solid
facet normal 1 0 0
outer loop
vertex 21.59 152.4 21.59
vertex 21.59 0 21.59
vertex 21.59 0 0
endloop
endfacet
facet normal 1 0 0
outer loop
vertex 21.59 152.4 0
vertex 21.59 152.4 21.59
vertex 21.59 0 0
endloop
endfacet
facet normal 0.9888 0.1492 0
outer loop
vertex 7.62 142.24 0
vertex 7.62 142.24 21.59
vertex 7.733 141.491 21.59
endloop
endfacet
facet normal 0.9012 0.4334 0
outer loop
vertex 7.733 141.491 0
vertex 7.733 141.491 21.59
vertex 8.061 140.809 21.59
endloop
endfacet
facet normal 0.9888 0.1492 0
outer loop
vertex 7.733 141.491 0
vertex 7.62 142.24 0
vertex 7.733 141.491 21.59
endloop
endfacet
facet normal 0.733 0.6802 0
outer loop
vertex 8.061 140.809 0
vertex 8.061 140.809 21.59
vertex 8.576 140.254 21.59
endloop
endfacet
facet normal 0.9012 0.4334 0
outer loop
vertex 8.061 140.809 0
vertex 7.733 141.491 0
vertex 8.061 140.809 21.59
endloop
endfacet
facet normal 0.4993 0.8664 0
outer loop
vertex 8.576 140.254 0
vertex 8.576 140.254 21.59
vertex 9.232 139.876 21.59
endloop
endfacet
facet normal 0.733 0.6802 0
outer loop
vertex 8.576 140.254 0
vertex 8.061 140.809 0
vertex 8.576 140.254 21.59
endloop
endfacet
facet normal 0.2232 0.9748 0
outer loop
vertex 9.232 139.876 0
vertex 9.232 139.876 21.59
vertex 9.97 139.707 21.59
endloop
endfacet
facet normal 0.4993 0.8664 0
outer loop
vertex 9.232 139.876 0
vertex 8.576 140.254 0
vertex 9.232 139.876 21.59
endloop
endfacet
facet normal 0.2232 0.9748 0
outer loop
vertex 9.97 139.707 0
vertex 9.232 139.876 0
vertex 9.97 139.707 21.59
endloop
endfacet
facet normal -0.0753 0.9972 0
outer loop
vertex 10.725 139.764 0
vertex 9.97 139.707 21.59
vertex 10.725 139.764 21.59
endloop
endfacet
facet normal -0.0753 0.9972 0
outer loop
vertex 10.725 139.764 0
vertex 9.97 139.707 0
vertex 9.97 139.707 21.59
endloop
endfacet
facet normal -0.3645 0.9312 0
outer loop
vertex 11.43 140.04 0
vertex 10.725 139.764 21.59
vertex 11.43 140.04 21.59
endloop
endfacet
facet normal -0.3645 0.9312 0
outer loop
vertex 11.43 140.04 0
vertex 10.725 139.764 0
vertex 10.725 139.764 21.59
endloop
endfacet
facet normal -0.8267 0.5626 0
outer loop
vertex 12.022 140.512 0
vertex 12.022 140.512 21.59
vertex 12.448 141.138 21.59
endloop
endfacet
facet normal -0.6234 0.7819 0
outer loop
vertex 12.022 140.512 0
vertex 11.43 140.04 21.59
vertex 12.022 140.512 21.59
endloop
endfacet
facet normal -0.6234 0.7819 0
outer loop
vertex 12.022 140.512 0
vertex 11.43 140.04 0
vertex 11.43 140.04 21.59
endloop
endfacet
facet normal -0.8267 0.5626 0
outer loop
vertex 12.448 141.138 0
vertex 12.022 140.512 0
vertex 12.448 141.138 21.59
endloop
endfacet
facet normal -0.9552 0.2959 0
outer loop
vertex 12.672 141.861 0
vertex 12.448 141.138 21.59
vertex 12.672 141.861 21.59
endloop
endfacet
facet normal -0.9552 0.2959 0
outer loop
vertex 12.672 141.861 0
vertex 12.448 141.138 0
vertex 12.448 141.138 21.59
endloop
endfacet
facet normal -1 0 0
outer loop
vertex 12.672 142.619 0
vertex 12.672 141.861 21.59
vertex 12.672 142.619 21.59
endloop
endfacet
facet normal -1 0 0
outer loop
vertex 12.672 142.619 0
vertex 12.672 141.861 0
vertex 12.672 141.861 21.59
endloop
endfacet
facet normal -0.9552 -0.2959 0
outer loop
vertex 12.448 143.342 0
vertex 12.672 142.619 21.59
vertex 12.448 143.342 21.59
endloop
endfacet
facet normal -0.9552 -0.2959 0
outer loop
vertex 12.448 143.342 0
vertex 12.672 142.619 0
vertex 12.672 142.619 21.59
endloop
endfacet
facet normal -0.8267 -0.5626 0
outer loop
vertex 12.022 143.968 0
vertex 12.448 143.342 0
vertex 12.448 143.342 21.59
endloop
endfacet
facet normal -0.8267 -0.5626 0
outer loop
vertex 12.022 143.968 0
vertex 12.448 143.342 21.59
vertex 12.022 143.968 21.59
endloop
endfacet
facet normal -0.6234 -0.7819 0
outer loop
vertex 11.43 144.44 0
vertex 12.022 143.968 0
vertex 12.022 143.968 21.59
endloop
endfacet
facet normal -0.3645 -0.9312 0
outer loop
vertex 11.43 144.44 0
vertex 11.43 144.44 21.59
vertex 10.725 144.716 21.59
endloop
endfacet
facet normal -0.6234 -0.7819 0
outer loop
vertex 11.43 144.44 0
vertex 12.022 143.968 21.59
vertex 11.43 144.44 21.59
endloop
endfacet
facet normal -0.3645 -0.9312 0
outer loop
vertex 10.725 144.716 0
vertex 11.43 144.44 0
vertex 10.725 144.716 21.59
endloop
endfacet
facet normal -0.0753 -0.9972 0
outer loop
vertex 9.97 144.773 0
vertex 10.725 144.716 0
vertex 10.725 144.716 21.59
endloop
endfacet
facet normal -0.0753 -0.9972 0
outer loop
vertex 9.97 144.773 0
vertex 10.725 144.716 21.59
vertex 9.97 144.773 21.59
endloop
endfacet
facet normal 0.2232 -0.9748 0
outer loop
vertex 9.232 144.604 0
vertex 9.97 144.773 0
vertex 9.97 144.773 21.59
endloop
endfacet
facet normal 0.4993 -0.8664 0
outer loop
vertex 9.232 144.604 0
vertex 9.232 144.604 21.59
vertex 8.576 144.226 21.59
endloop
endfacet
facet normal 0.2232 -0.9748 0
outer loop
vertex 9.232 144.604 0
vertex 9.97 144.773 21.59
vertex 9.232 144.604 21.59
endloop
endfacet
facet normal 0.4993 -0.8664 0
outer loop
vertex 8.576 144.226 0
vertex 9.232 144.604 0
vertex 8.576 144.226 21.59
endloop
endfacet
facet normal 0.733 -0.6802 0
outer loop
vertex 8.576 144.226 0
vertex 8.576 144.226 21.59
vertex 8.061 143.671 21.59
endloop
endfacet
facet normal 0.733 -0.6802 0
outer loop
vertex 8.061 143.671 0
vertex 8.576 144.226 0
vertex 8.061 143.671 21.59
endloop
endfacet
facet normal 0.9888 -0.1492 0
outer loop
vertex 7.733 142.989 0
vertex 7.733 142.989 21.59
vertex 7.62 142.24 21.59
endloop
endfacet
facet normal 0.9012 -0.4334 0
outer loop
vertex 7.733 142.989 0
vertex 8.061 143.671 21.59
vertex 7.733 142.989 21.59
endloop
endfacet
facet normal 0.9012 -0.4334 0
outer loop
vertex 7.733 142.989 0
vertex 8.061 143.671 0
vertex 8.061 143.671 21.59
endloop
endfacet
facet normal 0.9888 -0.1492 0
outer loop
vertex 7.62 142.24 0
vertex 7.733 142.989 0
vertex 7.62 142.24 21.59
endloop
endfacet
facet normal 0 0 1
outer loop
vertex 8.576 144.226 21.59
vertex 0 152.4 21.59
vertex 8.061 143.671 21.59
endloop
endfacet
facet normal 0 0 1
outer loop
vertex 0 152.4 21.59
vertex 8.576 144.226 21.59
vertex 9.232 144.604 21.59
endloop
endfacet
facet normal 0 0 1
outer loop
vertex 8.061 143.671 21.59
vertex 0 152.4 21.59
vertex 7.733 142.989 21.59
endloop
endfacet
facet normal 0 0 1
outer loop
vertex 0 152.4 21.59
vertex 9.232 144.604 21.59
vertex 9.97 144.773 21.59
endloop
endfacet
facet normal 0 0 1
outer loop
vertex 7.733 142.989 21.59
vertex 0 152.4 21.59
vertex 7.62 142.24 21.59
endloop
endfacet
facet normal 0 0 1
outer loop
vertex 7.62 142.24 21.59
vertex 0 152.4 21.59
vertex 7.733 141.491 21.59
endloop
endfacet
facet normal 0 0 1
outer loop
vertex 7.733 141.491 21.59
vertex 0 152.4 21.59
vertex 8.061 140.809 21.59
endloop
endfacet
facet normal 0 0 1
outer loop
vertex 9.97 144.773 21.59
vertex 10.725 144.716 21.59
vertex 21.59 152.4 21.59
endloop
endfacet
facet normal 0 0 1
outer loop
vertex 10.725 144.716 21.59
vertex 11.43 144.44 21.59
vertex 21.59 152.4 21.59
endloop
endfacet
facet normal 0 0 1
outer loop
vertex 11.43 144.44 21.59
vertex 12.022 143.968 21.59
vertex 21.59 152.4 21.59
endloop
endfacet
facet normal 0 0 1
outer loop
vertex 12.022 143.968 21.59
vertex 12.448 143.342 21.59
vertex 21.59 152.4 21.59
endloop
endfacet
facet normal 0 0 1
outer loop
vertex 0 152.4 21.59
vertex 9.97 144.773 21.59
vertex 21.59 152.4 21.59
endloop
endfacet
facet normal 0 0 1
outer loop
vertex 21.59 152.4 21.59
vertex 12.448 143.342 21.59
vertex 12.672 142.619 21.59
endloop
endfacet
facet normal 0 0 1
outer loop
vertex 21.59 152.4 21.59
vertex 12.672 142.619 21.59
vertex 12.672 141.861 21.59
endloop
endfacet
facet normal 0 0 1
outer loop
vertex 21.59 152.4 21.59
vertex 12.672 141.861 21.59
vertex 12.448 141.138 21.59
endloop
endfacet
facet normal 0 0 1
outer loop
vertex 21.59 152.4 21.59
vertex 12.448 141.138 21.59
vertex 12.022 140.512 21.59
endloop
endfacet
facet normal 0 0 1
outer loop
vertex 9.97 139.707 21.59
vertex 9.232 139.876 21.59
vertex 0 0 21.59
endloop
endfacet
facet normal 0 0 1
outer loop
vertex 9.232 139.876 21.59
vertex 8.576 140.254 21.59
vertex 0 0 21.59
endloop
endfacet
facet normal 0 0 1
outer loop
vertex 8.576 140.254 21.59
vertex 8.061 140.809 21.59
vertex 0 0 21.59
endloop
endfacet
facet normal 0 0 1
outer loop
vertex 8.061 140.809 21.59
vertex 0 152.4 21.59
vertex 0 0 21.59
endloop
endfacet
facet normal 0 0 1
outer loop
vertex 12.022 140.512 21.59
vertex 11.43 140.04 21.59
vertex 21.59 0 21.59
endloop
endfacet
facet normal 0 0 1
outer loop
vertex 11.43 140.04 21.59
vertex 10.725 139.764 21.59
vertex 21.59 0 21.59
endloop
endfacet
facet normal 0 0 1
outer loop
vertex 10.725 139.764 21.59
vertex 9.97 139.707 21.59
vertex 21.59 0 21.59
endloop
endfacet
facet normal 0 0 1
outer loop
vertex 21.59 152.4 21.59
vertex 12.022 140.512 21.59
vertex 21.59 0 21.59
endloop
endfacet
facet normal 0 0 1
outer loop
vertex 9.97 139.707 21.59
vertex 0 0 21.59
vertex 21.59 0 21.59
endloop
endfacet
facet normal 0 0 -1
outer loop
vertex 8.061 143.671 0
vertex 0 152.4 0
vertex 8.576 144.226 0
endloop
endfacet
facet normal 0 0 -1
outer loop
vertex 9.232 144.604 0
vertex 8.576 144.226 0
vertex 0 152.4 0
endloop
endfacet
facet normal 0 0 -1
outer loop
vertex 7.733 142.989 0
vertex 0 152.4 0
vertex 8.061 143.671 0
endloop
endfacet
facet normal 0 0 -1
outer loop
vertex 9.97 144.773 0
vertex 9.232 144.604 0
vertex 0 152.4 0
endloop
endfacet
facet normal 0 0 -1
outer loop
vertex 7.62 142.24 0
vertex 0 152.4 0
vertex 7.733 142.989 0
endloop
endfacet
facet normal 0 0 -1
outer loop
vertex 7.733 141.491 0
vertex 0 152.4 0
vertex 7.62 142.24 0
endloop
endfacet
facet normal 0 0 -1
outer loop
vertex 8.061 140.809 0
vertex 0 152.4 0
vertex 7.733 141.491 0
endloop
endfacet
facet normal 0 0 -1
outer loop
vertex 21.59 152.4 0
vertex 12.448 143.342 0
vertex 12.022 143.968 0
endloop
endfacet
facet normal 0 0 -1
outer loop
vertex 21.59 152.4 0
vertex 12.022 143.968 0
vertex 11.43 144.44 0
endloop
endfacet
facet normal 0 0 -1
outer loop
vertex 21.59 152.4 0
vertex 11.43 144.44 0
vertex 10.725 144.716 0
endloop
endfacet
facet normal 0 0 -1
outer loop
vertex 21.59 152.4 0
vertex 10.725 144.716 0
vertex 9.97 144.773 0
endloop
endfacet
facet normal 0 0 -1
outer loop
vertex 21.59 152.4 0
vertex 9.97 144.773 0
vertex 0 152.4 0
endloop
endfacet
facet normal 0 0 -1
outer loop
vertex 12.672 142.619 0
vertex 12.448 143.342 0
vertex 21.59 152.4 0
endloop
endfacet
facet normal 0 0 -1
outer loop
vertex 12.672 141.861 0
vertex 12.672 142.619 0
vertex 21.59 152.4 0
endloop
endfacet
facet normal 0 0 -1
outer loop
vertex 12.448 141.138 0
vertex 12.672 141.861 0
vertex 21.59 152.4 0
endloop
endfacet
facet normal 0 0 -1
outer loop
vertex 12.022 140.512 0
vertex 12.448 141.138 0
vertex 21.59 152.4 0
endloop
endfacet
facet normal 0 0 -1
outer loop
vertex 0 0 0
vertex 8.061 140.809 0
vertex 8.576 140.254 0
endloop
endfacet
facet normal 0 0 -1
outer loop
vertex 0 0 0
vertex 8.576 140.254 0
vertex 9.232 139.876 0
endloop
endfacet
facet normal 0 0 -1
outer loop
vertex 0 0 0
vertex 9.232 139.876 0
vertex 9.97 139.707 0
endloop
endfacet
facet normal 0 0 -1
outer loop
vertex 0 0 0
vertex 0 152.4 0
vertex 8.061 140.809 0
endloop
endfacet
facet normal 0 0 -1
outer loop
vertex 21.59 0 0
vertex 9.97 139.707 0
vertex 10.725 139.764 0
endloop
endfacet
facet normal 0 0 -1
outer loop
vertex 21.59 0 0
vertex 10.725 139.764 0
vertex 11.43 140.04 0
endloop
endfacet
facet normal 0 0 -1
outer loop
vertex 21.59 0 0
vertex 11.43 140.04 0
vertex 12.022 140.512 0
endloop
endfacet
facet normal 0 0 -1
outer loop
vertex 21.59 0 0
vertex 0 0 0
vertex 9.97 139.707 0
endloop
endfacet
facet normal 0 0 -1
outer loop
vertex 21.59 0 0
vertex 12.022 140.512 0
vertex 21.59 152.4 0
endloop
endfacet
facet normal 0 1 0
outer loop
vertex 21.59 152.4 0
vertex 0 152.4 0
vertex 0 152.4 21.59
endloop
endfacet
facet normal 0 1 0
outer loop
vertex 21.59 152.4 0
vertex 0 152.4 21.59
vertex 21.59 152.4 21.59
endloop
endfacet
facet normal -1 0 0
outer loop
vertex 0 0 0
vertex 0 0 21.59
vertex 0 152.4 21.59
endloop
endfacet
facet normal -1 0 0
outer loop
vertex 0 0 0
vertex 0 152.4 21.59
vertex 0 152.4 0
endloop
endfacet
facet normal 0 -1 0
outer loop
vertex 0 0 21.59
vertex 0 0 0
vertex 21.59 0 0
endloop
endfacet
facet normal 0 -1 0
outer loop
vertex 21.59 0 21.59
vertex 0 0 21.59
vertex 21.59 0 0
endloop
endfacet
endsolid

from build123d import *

# Parameters (mm, degrees)
SKETCH1_W           = 21.59
SKETCH1_H           = 21.59
BOSS_EXTRUDE1_DEPTH = 152.4
SKETCH2_R           = 2.54
CUT_EXTRUDE1_DEPTH  = 26.67


with BuildPart() as part:
    # Sketch1 → Boss-Extrude1 (new body)
    with BuildSketch(Plane(origin=(0, 0, 0), x_dir=(1, 0, 0), z_dir=(0, 1, 0))):
        with Locations((10.795, -10.795)):
            Rectangle(SKETCH1_W, SKETCH1_H)
    extrude(amount=BOSS_EXTRUDE1_DEPTH)

    # Sketch2 → Cut-Extrude1 (cut)
    with BuildSketch(Plane.XY):
        with Locations(Location((10.16, 142.24, 0), (0, 0, 180))):
            Circle(SKETCH2_R)
    extrude(amount=CUT_EXTRUDE1_DEPTH, mode=Mode.SUBTRACT)


solid = part.part
